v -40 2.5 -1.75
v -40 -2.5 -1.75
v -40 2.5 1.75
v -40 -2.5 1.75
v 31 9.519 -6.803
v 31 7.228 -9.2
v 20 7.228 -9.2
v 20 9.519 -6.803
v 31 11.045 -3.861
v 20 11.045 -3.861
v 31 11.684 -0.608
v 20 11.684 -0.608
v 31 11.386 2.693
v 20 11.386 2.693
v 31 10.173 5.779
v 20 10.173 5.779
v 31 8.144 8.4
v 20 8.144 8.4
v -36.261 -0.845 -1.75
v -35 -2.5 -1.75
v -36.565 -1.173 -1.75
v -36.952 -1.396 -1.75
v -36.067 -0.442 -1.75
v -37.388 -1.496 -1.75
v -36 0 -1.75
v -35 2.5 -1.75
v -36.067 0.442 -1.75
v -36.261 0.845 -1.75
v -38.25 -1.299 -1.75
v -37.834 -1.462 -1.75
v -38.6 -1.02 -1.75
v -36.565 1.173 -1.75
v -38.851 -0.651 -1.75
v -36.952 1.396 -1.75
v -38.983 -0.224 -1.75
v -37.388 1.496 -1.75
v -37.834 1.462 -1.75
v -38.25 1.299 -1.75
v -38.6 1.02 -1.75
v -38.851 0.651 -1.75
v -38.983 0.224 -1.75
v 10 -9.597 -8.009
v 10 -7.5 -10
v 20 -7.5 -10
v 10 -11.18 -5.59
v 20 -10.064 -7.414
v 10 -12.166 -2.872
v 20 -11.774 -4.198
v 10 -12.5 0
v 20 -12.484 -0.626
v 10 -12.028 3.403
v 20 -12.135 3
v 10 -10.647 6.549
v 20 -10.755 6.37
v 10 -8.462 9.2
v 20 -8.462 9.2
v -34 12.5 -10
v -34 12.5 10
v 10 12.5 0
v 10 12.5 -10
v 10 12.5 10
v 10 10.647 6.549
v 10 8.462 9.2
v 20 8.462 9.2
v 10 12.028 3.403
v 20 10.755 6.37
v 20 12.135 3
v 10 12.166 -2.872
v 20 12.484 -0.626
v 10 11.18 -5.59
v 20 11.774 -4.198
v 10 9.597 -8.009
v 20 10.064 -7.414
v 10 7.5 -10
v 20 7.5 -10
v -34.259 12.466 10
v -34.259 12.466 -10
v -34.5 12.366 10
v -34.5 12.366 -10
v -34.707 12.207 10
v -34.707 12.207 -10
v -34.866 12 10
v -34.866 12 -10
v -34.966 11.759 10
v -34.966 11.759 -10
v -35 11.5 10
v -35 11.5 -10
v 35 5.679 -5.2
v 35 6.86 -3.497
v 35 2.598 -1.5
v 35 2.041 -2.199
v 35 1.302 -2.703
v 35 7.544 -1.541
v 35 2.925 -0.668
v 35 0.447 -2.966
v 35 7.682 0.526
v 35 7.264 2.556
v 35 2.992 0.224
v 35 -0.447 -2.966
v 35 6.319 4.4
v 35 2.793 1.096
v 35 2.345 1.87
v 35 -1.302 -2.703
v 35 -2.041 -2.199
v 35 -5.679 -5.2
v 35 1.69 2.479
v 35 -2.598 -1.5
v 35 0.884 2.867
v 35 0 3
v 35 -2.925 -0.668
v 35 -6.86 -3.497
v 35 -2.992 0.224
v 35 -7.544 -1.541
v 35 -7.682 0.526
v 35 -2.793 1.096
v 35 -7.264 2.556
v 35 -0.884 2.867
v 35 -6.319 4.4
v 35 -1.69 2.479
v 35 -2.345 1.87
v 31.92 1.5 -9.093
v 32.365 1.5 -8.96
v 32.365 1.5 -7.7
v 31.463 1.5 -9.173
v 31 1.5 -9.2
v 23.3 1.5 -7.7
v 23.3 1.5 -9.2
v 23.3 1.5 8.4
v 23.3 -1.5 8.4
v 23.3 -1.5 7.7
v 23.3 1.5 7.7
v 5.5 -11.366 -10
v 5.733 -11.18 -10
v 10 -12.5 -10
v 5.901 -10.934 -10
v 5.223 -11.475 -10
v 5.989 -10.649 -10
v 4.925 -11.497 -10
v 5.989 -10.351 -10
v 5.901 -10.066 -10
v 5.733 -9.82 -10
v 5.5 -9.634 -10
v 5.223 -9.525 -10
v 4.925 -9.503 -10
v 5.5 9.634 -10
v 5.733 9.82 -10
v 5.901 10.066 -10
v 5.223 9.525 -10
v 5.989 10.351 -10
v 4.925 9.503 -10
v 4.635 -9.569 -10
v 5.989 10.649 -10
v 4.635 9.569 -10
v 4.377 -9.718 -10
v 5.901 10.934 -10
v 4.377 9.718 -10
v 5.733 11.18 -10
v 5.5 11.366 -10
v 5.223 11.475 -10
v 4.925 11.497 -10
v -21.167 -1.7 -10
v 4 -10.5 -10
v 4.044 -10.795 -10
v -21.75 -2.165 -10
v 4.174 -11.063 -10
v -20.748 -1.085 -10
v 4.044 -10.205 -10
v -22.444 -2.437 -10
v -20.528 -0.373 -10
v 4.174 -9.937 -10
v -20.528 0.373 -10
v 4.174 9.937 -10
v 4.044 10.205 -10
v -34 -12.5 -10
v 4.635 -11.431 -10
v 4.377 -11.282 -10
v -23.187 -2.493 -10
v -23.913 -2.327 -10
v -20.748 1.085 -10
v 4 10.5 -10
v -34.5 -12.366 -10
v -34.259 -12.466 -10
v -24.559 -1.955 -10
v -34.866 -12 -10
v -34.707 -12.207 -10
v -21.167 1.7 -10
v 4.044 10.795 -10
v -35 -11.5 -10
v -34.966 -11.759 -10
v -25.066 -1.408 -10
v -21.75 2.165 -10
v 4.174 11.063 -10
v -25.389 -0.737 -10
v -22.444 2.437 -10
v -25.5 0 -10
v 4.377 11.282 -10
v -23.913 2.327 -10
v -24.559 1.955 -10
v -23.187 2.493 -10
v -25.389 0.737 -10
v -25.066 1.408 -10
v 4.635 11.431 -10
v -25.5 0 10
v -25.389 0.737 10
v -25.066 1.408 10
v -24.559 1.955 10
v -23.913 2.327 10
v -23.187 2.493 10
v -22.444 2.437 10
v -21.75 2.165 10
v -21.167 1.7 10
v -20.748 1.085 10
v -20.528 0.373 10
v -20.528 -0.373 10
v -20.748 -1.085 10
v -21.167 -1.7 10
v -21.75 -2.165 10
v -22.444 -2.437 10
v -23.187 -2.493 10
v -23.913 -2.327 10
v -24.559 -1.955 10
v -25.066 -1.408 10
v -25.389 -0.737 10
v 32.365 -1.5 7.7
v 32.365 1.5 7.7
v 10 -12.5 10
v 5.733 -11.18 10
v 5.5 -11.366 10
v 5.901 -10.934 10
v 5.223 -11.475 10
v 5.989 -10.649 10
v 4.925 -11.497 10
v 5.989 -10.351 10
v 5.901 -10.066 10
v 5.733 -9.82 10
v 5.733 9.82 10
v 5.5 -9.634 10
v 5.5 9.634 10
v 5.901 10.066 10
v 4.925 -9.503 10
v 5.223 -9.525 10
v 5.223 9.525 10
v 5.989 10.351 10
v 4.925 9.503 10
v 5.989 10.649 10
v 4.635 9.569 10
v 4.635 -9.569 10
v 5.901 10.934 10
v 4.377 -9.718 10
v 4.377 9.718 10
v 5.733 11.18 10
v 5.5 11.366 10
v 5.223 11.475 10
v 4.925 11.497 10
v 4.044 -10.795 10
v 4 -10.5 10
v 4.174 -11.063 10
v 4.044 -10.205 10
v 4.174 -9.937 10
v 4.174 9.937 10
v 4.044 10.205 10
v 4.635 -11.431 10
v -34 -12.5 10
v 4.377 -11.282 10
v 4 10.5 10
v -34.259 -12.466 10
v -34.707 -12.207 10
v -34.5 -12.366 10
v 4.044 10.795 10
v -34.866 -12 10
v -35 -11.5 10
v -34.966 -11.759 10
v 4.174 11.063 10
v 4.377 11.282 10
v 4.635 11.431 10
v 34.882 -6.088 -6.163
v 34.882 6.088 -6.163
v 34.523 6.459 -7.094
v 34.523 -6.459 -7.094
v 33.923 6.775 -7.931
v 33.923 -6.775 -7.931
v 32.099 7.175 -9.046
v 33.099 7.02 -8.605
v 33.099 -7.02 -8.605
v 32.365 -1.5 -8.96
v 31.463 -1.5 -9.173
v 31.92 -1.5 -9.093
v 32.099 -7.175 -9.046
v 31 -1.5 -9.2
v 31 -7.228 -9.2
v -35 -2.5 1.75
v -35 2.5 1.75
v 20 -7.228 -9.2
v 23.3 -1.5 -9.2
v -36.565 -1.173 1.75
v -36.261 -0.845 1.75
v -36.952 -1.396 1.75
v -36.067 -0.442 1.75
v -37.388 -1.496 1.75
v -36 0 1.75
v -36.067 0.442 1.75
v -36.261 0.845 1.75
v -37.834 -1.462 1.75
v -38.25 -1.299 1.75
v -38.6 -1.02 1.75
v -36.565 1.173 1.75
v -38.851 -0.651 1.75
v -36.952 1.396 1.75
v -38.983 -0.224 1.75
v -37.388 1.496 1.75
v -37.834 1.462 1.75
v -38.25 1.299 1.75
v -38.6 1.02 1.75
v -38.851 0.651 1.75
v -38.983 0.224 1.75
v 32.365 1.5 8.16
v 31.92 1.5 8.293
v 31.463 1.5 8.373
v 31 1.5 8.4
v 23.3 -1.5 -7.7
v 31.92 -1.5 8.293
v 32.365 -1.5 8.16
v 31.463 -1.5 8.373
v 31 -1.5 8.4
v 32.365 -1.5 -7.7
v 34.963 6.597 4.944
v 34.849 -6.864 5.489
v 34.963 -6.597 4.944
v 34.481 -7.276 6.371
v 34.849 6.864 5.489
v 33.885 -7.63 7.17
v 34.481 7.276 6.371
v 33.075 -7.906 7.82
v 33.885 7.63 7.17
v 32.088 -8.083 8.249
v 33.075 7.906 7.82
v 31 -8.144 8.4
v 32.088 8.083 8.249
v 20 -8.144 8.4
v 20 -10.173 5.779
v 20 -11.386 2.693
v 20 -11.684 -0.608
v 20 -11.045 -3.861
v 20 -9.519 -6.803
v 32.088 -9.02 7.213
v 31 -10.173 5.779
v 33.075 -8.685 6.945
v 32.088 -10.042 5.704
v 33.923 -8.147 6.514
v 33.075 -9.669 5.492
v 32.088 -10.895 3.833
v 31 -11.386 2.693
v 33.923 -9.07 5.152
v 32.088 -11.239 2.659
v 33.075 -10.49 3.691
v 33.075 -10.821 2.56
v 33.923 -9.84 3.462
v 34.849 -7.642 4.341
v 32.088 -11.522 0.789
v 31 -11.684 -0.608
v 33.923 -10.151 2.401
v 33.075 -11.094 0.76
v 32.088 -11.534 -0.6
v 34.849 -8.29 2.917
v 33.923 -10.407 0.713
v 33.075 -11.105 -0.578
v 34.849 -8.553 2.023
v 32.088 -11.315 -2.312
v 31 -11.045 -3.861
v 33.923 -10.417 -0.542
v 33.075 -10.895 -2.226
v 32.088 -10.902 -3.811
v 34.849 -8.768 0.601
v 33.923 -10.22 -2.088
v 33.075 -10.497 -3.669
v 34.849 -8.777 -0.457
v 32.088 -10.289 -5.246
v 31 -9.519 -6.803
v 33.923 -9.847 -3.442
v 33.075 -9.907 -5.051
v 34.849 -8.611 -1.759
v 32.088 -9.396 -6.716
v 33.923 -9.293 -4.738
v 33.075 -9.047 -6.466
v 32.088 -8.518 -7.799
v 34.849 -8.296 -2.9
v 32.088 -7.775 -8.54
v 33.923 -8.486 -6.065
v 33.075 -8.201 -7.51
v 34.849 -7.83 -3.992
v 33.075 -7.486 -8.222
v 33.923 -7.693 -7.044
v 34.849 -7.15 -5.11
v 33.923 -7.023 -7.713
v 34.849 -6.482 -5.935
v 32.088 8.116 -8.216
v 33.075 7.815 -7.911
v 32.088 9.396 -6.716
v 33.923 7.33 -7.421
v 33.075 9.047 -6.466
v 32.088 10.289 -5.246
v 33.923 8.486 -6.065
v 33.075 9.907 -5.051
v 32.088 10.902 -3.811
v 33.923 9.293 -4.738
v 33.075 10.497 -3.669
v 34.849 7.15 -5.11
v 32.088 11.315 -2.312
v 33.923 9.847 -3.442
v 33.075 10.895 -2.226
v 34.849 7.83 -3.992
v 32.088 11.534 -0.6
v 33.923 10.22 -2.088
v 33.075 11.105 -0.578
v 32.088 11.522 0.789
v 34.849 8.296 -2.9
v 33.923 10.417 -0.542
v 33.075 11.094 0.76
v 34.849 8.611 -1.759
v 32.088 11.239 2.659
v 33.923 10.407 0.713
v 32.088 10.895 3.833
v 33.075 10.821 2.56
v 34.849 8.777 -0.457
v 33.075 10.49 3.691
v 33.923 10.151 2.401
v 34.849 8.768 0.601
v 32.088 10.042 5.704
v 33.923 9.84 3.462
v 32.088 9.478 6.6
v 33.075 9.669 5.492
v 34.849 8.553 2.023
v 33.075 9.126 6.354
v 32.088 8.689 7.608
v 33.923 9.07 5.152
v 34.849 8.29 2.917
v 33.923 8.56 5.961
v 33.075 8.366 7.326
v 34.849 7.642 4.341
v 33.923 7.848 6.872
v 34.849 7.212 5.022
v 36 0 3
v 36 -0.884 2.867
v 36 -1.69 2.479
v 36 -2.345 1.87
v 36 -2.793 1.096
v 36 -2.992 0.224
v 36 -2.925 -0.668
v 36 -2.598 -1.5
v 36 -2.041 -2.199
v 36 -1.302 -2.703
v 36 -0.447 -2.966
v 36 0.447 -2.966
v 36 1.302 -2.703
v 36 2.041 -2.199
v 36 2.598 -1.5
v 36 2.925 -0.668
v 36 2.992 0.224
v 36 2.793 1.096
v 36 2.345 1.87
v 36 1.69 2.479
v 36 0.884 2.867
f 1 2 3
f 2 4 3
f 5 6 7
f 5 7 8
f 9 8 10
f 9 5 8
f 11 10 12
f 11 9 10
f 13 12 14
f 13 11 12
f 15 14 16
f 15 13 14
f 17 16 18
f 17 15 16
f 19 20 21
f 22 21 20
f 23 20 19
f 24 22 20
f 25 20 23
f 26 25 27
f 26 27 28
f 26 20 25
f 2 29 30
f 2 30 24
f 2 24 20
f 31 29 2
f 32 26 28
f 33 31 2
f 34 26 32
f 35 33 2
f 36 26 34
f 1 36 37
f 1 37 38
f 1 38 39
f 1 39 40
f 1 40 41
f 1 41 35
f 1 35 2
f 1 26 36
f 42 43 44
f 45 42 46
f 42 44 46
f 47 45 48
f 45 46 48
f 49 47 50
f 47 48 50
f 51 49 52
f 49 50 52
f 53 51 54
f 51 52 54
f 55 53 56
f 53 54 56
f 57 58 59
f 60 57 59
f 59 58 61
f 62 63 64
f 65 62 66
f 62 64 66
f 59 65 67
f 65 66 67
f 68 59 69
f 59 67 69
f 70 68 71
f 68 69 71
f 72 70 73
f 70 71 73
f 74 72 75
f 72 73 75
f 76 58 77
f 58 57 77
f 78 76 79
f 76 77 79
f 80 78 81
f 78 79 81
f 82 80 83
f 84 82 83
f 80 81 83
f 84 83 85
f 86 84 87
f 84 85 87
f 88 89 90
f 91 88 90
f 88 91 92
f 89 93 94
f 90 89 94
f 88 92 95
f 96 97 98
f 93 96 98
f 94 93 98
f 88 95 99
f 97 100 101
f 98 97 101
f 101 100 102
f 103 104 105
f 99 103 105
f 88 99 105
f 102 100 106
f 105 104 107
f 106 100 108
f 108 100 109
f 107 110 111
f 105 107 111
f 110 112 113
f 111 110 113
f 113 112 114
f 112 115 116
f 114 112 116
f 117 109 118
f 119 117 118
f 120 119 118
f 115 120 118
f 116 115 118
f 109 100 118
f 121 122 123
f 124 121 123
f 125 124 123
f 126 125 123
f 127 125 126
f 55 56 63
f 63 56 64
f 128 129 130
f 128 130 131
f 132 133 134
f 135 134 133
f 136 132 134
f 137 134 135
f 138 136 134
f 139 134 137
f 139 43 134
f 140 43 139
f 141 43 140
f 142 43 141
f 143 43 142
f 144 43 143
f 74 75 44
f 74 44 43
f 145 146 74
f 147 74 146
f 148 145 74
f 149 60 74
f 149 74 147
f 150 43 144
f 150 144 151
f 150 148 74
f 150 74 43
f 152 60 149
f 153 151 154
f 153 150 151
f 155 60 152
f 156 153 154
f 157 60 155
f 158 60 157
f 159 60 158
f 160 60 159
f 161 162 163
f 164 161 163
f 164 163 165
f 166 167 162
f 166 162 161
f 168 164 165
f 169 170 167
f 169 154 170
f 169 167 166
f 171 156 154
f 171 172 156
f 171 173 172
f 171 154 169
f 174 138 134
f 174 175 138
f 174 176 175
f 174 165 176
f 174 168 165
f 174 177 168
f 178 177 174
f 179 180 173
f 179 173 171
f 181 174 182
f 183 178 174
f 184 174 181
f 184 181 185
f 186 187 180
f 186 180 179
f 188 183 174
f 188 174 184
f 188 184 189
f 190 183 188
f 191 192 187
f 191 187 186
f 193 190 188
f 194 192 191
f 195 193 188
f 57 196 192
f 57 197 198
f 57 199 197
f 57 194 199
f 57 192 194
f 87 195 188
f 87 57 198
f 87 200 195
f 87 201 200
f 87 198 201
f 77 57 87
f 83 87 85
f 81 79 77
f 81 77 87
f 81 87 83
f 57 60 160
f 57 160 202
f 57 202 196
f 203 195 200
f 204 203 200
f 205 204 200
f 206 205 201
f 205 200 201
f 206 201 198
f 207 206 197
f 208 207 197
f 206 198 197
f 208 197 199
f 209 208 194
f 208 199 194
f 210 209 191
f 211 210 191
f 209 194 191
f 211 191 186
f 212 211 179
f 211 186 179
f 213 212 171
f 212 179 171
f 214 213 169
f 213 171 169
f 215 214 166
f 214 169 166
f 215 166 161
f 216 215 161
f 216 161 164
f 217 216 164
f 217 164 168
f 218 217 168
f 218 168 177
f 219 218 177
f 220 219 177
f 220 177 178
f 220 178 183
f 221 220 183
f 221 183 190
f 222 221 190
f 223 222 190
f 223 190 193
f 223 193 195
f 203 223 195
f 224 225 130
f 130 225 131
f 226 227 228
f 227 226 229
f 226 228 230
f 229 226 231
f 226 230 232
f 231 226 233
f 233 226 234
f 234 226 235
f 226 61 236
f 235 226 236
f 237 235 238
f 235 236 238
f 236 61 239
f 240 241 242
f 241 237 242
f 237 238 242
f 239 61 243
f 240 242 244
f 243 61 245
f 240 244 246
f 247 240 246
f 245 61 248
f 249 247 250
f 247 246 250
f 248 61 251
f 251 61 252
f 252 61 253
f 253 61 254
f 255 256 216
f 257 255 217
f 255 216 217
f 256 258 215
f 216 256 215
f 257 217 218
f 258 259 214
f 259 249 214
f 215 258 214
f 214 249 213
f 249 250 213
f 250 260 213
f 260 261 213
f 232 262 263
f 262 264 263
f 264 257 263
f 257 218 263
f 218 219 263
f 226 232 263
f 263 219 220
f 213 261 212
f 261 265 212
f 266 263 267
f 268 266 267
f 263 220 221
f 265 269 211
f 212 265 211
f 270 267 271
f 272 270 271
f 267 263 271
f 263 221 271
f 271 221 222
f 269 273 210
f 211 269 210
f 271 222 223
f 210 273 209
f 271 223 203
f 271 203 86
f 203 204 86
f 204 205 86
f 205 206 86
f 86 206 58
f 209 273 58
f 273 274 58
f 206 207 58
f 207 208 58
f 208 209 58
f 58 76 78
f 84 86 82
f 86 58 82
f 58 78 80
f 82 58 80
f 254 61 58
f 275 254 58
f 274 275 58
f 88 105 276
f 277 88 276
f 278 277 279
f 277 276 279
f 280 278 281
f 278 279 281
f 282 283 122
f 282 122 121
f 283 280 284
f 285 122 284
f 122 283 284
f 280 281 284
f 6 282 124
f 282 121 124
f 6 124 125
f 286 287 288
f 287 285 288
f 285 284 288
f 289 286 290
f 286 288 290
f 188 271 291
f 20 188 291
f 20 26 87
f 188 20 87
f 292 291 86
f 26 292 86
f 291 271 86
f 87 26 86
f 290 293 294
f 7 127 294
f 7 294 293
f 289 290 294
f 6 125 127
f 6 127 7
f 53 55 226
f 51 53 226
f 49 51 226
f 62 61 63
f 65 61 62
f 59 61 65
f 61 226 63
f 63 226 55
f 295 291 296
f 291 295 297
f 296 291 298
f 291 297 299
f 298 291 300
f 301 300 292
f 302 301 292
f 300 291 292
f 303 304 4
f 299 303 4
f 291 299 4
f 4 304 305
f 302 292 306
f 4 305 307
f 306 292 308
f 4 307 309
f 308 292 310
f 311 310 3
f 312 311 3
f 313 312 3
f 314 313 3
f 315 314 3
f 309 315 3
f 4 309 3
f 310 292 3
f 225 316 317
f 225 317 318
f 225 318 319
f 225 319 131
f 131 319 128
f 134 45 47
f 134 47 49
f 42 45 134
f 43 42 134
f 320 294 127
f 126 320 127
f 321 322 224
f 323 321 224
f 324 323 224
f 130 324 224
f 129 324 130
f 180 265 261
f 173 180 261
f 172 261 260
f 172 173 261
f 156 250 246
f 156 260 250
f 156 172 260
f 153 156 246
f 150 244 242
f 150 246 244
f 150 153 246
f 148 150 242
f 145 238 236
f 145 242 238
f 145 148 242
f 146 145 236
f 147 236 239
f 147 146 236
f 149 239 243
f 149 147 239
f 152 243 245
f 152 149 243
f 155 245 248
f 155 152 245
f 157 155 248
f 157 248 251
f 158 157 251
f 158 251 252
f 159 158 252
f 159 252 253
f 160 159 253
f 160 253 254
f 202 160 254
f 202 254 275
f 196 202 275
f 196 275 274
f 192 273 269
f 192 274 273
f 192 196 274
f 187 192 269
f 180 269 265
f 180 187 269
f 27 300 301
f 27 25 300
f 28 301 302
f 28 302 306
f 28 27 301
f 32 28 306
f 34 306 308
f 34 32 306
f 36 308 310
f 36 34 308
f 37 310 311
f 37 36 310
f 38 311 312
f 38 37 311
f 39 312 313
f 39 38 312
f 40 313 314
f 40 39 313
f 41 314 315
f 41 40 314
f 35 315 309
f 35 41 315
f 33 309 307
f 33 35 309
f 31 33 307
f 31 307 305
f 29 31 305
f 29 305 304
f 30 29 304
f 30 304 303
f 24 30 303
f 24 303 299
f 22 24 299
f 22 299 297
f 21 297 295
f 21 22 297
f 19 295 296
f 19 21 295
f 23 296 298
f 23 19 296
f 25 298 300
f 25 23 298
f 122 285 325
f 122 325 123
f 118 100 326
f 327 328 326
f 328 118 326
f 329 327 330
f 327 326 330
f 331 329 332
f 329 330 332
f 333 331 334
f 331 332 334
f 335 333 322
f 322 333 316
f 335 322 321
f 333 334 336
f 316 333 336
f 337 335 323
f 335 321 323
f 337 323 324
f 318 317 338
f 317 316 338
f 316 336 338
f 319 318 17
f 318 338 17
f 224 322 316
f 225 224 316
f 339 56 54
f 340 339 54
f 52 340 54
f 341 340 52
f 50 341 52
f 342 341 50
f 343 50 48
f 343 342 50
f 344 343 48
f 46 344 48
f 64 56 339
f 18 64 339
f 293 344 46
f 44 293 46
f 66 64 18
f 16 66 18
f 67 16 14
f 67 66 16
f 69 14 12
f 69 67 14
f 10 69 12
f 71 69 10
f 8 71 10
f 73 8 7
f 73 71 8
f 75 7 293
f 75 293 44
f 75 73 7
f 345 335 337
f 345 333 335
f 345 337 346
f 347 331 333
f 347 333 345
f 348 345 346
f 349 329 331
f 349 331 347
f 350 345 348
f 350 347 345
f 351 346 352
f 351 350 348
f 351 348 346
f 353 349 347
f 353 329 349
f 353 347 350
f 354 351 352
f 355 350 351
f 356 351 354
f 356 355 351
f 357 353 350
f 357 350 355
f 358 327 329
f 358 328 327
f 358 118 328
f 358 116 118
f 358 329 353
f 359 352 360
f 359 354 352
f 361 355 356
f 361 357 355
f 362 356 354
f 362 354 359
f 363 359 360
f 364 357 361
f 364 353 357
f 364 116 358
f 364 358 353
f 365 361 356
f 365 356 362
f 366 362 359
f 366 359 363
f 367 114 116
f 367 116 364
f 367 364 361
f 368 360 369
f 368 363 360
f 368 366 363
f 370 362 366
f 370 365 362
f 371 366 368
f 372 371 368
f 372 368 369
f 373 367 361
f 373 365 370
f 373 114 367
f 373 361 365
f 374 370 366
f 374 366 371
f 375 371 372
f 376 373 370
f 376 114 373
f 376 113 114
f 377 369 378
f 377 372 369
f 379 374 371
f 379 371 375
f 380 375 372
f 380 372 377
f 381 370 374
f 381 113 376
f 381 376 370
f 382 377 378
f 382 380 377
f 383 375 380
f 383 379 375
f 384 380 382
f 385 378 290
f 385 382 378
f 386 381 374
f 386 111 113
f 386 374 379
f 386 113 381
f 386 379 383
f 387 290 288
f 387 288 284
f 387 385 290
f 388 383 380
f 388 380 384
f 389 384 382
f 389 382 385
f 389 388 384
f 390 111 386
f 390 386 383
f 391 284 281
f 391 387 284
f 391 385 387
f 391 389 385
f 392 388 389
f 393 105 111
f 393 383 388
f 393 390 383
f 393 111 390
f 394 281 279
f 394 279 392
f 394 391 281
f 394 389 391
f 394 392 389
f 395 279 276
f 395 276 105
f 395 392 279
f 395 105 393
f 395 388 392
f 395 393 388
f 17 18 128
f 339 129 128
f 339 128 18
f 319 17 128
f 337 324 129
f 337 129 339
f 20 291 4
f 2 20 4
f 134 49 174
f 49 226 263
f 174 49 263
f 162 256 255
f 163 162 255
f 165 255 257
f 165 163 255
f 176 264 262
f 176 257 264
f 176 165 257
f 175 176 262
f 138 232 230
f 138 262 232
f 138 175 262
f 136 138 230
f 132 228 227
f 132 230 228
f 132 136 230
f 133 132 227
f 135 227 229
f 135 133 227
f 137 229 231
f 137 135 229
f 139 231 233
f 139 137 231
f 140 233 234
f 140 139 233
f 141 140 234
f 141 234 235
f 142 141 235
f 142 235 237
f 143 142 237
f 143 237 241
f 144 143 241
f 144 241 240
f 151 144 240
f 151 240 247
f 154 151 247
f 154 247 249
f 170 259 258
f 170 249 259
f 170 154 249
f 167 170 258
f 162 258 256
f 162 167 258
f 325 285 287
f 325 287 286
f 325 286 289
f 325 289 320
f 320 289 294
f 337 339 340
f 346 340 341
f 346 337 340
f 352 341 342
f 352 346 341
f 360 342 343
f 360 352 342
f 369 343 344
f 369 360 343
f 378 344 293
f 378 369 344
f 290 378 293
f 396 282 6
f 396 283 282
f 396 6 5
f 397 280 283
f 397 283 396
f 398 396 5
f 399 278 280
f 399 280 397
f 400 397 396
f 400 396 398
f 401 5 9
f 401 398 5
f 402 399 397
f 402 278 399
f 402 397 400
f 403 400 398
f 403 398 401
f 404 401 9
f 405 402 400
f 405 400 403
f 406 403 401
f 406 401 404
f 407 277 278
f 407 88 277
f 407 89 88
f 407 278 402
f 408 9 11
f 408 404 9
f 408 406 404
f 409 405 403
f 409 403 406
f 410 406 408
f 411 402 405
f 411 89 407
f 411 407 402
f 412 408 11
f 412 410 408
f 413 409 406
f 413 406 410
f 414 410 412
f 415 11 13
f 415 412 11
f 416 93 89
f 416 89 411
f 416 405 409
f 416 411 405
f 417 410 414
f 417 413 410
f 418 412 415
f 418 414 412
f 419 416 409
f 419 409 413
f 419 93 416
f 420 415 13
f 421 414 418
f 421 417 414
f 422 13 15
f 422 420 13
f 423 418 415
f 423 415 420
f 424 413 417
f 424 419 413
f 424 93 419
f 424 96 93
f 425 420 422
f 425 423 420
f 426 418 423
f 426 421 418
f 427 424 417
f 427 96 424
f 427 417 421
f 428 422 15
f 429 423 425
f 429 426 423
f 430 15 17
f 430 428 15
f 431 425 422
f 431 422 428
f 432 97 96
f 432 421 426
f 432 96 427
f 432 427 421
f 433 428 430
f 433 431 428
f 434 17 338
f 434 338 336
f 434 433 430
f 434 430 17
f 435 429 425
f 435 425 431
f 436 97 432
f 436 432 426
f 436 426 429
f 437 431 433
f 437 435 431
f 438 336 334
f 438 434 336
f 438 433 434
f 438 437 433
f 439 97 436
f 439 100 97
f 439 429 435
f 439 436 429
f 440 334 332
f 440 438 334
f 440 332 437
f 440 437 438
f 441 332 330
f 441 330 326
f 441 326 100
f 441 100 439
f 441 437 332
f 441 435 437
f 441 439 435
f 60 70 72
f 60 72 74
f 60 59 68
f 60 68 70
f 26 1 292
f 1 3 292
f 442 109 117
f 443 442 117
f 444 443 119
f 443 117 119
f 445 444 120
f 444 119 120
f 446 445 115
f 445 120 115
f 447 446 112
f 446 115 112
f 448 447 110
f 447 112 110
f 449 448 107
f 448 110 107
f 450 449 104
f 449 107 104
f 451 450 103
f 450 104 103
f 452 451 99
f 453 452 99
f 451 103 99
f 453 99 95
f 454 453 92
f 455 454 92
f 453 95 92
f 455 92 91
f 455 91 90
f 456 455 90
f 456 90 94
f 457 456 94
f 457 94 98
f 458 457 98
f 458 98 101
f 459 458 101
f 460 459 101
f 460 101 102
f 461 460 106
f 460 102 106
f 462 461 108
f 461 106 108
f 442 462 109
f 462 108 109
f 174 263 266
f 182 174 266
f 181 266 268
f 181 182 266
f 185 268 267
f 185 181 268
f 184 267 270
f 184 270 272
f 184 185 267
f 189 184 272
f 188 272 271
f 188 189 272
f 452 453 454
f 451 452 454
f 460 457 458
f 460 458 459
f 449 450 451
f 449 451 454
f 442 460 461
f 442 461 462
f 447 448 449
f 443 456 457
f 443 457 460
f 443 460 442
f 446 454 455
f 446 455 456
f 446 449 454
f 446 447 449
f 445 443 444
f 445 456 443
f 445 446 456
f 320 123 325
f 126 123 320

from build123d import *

# Parameters (mm, degrees)
BOSS_EXTRUDE1_DEPTH     = 10
CUT_EXTRUDE2_DEPTH      = 25
SKETCH4_W               = 2.420711262391846
SKETCH4_H               = 16.924538398432034
CUT_EXTRUDE3_DEPTH      = 25
CUT_EXTRUDE4_DEPTH      = 15.000000000000002
FILLET1_R               = 4
SKETCH6_R               = 3
BOSS_EXTRUDE2_DEPTH     = 1
SKETCH7_W               = 9.06468295299787
SKETCH7_H               = 3
CUT_EXTRUDE5_DEPTH      = 1.5
FILLET2_R               = 1
SKETCH8_R               = 1.500000000000004
BOSS_EXTRUDE3_DEPTH     = 1.75
CUT_EXTRUDE7_DEPTH      = 47.435439052516784
CUT_EXTRUDE7_DEPTH_BACK = 47.435439052516784
SKETCH9_R               = 1
SKETCH10_R              = 2.4999999999999982
CUT_EXTRUDE8_DEPTH      = 47.435439052516784


with BuildPart() as part:
    # Sketch1 → Boss-Extrude1 (new, symmetric)
    with BuildSketch(Plane.XY):
        Polygon((34.99999999999999, -12.5), (-35.00000000000001, -12.500000000000005), (-35.00000000000001, 12.499999999999995), (34.99999999999999, 12.500000000000002), align=None)
    extrude(amount=BOSS_EXTRUDE1_DEPTH, both=True)

    # Sketch2 → Cut-Extrude2 (cut)
    with BuildSketch(Plane(origin=(34.99999999999999, 0, 0), x_dir=(0, 0, -1), z_dir=(1, 0, 0))):
        with BuildLine():
            Line((-10, 12.500000000000002), (-10, 7.500000000000002))
            ThreePointArc((-9.999999999999998, 7.500000000000003), (-5.590169943749482, 11.180339887498945), (-1.821e-14, 12.500000000000004))
            Line((-1.776e-14, 12.500000000000002), (-10, 12.500000000000002))
        make_face()
        with BuildLine():
            Line((10, 12.500000000000002), (-1.776e-14, 12.500000000000002))
            ThreePointArc((-1.821e-14, 12.500000000000004), (5.590169943749467, 11.180339887498956), (10, 7.500000000000001))
            Line((10, 7.500000000000002), (10, 12.500000000000002))
        make_face()
        with BuildLine():
            ThreePointArc((9.999999999999998, -7.500000000000003), (5.590169943749469, -11.180339887498953), (-1.554e-14, -12.5))
            Line((-1.599e-14, -12.5), (10, -12.5))
            Line((10, -12.5), (10, -7.500000000000002))
        make_face()
        with BuildLine():
            ThreePointArc((-1.554e-14, -12.5), (-5.590169943749482, -11.180339887498945), (-10, -7.500000000000001))
            Line((-10, -7.500000000000002), (-10, -12.5))
            Line((-10, -12.5), (-1.599e-14, -12.5))
        make_face()
    extrude(amount=-CUT_EXTRUDE2_DEPTH, mode=Mode.SUBTRACT)

    # Sketch4 → Cut-Extrude3 (cut)
    with BuildSketch(Plane(origin=(34.99999999999999, 0, 0), x_dir=(0, 0, -1), z_dir=(1, 0, 0))):
        with Locations((-10.41035563119592, 0)):
            Rectangle(SKETCH4_W, SKETCH4_H)
    extrude(amount=-CUT_EXTRUDE3_DEPTH, mode=Mode.SUBTRACT)

    # Sketch5 → Cut-Extrude4 (cut)
    with BuildSketch(Plane(origin=(34.99999999999999, 0, 0), x_dir=(0, 0, -1), z_dir=(1, 0, 0))):
        with BuildLine():
            Line((-9.199999999999998, 8.462269199216015), (-9.199999999999996, -8.462269199216017))
            ThreePointArc((-9.199999999999996, -8.462269199216017), (0.6256920192394629, -12.484330558626684), (10, -7.500000000000002))
            Line((10, -7.500000000000002), (10, 7.500000000000002))
            ThreePointArc((10, 7.500000000000002), (0.6256920192394629, 12.484330558626686), (-9.199999999999998, 8.462269199216015))
        make_face()
        with BuildLine():
            Line((-8.399999999999997, 8.144323176298942), (-8.399999999999997, -8.144323176298942))
            ThreePointArc((-8.399999999999997, -8.144323176298942), (0.608047219709459, -11.684189256367068), (9.2, -7.228416147400481))
            Line((9.2, -7.228416147400481), (9.2, 7.228416147400481))
            ThreePointArc((9.2, 7.228416147400481), (0.6080472197094615, 11.684189256367066), (-8.399999999999997, 8.144323176298942))
        make_face(mode=Mode.SUBTRACT)
    extrude(amount=-CUT_EXTRUDE4_DEPTH, mode=Mode.SUBTRACT)

    # Fillet1
    # the kernel refuses this fillet: 4 mm, written as the material it takes off along each edge
    with BuildSketch(Plane(origin=(34.99999999999999, -4.44e-15, 6.7e-16), x_dir=(0, -0.1880210929197643, -0.982164990527181), z_dir=(0, -0.982164990527181, 0.1880210929197643))) as fillet1_piece_1:
        with BuildLine():
            CenterArc((11.700000000000003 - FILLET1_R, -FILLET1_R), FILLET1_R, 0, 89.99999999999999)
            Line((11.700000000000003 - FILLET1_R, 0), (11.700000000000003, 0))
            Line((11.700000000000003, 0), (11.700000000000003, -FILLET1_R))
        make_face()
    revolve(axis=Axis((34.99999999999999, -4.44e-15, 6.7e-16), (1, 0, 0)), revolution_arc=195.71664993769073, mode=Mode.SUBTRACT)
    with BuildSketch(Plane(origin=(34.99999999999999, -17.22841614740048, -9.2), x_dir=(-1, 0, 0), z_dir=(0, 1, 0))) as fillet1_piece_2:
        with BuildLine():
            CenterArc((FILLET1_R, FILLET1_R), FILLET1_R, 180, 90)
            Line((0, FILLET1_R), (0, 0))
            Line((0, 0), (FILLET1_R, 0))
        make_face()
    extrude(amount=34.45683229480096, mode=Mode.SUBTRACT)
    with BuildSketch(Plane(origin=(34.99999999999999, 0, 6.7e-16), x_dir=(0, 0.0850574768635666, 0.9963760462945724), z_dir=(0, 0.9963760462945724, -0.0850574768635666))) as fillet1_piece_3:
        with BuildLine():
            CenterArc((11.700000000000003 - FILLET1_R, -FILLET1_R), FILLET1_R, 0, 90)
            Line((11.700000000000003 - FILLET1_R, 0), (11.700000000000003, 0))
            Line((11.700000000000003, 0), (11.700000000000003, -FILLET1_R))
        make_face()
    revolve(axis=Axis((34.99999999999999, 0, 6.7e-16), (1, 0, 0)), revolution_arc=195.71664993769085, mode=Mode.SUBTRACT)
    with BuildSketch(Plane(origin=(34.99999999999999, 18.14432317629894, 8.399999999999997), x_dir=(-1, 0, 0), z_dir=(0, -1, 0))) as fillet1_piece_4:
        with BuildLine():
            CenterArc((FILLET1_R, FILLET1_R), FILLET1_R, 180, 90)
            Line((0, FILLET1_R), (0, 0))
            Line((0, 0), (FILLET1_R, 0))
        make_face()
    extrude(amount=36.28864635259788, mode=Mode.SUBTRACT)

    # Sketch6 → Boss-Extrude2 (add)
    with BuildSketch(Plane(origin=(34.99999999999999, 0, 0), x_dir=(0, 0, -1), z_dir=(1, 0, 0))):
        with Locations(Location((0, 0, 0), (0, 0, 180))):
            Circle(SKETCH6_R)
    extrude(amount=BOSS_EXTRUDE2_DEPTH)

    # Sketch7 → Cut-Extrude5 (cut)
    with BuildSketch(Plane(origin=(0, 0, -9.2), x_dir=(-1, 0, 0), z_dir=(0, 0, -1))):
        with Locations((-27.832741428017933, 0)):
            Rectangle(SKETCH7_W, SKETCH7_H)
    cut_extrude5 = extrude(amount=-CUT_EXTRUDE5_DEPTH, mode=Mode.SUBTRACT)

    # Mirror1: Cut-Extrude5 across plane
    add(cut_extrude5.mirror(Plane.XY), mode=Mode.SUBTRACT)

    # Fillet2
    fillet2_edges = [part.edges().sort_by_distance(p)[0] for p in [
        (-35.00000000000001, 12.499999999999995, 0),
        (-35.00000000000001, -12.500000000000005, 0),
    ]]
    fillet(fillet2_edges, radius=FILLET2_R)

    # Sketch8 → Boss-Extrude3 (add, symmetric)
    with BuildSketch(Plane.XY):
        Polygon((-35.00000000000001, -2.4999999999999987), (-40.00000000000001, -2.499999999999998), (-40.00000000000001, 2.500000000000002), (-35.00000000000001, 2.4999999999999987), align=None)
        with Locations((-37.50000000000001, 2.17e-15)):
            Circle(SKETCH8_R, mode=Mode.SUBTRACT)
    extrude(amount=BOSS_EXTRUDE3_DEPTH, both=True)

    # Sketch9 → Cut-Extrude7 (cut, two sides: drawn at the far end of the back side and taken through both)
    with BuildSketch(Plane.XY.offset(10).offset(-CUT_EXTRUDE7_DEPTH_BACK)):
        with Locations(Location((4.99999999999999, -10.500000000000004, 0), (0, 0, 180))):
            Circle(SKETCH9_R)
        with Locations(Location((4.99999999999999, 10.500000000000004, 0), (0, 0, 180))):
            Circle(SKETCH9_R)
    extrude(amount=CUT_EXTRUDE7_DEPTH + CUT_EXTRUDE7_DEPTH_BACK, mode=Mode.SUBTRACT)

    # Sketch10 → Cut-Extrude8 (cut, through all)
    with BuildSketch(Plane(origin=(0, 0, -10), x_dir=(-1, 0, 0), z_dir=(0, 0, -1))):
        with Locations((23.00000000000001, 0)):
            Circle(SKETCH10_R)
    extrude(amount=-CUT_EXTRUDE8_DEPTH, mode=Mode.SUBTRACT)


solid = part.part
